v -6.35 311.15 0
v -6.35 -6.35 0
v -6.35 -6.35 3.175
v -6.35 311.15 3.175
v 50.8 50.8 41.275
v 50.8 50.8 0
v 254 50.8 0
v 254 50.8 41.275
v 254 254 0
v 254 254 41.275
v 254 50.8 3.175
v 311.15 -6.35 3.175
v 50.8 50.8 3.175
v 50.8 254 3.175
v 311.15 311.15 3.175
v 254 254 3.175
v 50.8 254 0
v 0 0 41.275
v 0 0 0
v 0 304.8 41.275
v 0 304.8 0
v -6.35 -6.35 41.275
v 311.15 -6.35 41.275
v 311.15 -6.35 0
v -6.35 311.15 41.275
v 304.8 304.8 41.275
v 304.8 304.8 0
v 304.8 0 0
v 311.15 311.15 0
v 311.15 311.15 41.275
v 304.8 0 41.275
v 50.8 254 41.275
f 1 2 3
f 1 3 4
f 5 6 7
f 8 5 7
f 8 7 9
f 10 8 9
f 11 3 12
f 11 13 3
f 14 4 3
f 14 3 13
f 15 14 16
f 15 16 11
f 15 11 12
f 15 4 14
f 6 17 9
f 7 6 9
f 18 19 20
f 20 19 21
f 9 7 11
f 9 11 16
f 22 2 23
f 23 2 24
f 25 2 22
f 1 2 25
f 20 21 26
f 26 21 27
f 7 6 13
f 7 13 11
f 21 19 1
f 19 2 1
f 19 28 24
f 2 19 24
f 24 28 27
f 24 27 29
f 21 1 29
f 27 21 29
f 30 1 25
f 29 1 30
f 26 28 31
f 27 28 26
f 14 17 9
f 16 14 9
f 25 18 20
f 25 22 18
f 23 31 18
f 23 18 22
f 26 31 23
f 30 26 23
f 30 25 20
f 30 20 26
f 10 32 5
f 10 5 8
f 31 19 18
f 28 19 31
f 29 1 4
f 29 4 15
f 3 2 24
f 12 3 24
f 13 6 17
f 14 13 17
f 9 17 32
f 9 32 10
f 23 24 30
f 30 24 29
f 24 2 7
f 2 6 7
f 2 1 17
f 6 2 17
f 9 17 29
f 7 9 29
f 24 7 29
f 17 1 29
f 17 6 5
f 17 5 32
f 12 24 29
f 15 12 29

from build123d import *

# Parameters (mm, degrees)
F0_W     = 203.2
F0_H     = 203.2
F1_DEPTH = 41.275
F0_W_2   = 317.5
F0_H_2   = 317.5
F0_W_3   = 304.8
F0_H_3   = 304.8
F2_DEPTH = 3.175


with BuildPart() as f1:
    # F0 (on Top) → F1 (new body)
    with BuildSketch(Plane.XY):
        with Locations((152.4, 152.4)):
            Rectangle(F0_W, F0_H)
    extrude(amount=F1_DEPTH)


with BuildPart() as f1b:
    # F0 (on Top) → F1, piece 2 (new body)
    with BuildSketch(Plane.XY):
        with Locations((152.4, 152.4)):
            Rectangle(F0_W_2, F0_H_2)
        with Locations((152.4, 152.4)):
            Rectangle(F0_W_3, F0_H_3, mode=Mode.SUBTRACT)
    extrude(amount=F1_DEPTH)


with BuildPart() as f2:
    # F0 (on Top) → F2 (new body)
    with BuildSketch(Plane.XY):
        with Locations((152.4, 152.4)):
            Rectangle(F0_W_2, F0_H_2)
        with Locations((152.4, 152.4)):
            Rectangle(F0_W_3, F0_H_3, mode=Mode.SUBTRACT)
        with Locations((152.4, 152.4)):
            Rectangle(F0_W_3, F0_H_3)
        with Locations((152.4, 152.4)):
            Rectangle(F0_W, F0_H, mode=Mode.SUBTRACT)
    extrude(amount=F2_DEPTH)


solid = Compound([f1.part, f1b.part, f2.part])
